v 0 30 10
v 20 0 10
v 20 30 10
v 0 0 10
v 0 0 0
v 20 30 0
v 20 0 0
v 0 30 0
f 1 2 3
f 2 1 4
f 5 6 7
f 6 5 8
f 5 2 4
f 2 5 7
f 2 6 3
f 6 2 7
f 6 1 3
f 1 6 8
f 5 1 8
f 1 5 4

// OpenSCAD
// Dimensions (mm)
x = 20;
y = 30;
z = 10;

// Cube
cube([x, y, z], center = false);
